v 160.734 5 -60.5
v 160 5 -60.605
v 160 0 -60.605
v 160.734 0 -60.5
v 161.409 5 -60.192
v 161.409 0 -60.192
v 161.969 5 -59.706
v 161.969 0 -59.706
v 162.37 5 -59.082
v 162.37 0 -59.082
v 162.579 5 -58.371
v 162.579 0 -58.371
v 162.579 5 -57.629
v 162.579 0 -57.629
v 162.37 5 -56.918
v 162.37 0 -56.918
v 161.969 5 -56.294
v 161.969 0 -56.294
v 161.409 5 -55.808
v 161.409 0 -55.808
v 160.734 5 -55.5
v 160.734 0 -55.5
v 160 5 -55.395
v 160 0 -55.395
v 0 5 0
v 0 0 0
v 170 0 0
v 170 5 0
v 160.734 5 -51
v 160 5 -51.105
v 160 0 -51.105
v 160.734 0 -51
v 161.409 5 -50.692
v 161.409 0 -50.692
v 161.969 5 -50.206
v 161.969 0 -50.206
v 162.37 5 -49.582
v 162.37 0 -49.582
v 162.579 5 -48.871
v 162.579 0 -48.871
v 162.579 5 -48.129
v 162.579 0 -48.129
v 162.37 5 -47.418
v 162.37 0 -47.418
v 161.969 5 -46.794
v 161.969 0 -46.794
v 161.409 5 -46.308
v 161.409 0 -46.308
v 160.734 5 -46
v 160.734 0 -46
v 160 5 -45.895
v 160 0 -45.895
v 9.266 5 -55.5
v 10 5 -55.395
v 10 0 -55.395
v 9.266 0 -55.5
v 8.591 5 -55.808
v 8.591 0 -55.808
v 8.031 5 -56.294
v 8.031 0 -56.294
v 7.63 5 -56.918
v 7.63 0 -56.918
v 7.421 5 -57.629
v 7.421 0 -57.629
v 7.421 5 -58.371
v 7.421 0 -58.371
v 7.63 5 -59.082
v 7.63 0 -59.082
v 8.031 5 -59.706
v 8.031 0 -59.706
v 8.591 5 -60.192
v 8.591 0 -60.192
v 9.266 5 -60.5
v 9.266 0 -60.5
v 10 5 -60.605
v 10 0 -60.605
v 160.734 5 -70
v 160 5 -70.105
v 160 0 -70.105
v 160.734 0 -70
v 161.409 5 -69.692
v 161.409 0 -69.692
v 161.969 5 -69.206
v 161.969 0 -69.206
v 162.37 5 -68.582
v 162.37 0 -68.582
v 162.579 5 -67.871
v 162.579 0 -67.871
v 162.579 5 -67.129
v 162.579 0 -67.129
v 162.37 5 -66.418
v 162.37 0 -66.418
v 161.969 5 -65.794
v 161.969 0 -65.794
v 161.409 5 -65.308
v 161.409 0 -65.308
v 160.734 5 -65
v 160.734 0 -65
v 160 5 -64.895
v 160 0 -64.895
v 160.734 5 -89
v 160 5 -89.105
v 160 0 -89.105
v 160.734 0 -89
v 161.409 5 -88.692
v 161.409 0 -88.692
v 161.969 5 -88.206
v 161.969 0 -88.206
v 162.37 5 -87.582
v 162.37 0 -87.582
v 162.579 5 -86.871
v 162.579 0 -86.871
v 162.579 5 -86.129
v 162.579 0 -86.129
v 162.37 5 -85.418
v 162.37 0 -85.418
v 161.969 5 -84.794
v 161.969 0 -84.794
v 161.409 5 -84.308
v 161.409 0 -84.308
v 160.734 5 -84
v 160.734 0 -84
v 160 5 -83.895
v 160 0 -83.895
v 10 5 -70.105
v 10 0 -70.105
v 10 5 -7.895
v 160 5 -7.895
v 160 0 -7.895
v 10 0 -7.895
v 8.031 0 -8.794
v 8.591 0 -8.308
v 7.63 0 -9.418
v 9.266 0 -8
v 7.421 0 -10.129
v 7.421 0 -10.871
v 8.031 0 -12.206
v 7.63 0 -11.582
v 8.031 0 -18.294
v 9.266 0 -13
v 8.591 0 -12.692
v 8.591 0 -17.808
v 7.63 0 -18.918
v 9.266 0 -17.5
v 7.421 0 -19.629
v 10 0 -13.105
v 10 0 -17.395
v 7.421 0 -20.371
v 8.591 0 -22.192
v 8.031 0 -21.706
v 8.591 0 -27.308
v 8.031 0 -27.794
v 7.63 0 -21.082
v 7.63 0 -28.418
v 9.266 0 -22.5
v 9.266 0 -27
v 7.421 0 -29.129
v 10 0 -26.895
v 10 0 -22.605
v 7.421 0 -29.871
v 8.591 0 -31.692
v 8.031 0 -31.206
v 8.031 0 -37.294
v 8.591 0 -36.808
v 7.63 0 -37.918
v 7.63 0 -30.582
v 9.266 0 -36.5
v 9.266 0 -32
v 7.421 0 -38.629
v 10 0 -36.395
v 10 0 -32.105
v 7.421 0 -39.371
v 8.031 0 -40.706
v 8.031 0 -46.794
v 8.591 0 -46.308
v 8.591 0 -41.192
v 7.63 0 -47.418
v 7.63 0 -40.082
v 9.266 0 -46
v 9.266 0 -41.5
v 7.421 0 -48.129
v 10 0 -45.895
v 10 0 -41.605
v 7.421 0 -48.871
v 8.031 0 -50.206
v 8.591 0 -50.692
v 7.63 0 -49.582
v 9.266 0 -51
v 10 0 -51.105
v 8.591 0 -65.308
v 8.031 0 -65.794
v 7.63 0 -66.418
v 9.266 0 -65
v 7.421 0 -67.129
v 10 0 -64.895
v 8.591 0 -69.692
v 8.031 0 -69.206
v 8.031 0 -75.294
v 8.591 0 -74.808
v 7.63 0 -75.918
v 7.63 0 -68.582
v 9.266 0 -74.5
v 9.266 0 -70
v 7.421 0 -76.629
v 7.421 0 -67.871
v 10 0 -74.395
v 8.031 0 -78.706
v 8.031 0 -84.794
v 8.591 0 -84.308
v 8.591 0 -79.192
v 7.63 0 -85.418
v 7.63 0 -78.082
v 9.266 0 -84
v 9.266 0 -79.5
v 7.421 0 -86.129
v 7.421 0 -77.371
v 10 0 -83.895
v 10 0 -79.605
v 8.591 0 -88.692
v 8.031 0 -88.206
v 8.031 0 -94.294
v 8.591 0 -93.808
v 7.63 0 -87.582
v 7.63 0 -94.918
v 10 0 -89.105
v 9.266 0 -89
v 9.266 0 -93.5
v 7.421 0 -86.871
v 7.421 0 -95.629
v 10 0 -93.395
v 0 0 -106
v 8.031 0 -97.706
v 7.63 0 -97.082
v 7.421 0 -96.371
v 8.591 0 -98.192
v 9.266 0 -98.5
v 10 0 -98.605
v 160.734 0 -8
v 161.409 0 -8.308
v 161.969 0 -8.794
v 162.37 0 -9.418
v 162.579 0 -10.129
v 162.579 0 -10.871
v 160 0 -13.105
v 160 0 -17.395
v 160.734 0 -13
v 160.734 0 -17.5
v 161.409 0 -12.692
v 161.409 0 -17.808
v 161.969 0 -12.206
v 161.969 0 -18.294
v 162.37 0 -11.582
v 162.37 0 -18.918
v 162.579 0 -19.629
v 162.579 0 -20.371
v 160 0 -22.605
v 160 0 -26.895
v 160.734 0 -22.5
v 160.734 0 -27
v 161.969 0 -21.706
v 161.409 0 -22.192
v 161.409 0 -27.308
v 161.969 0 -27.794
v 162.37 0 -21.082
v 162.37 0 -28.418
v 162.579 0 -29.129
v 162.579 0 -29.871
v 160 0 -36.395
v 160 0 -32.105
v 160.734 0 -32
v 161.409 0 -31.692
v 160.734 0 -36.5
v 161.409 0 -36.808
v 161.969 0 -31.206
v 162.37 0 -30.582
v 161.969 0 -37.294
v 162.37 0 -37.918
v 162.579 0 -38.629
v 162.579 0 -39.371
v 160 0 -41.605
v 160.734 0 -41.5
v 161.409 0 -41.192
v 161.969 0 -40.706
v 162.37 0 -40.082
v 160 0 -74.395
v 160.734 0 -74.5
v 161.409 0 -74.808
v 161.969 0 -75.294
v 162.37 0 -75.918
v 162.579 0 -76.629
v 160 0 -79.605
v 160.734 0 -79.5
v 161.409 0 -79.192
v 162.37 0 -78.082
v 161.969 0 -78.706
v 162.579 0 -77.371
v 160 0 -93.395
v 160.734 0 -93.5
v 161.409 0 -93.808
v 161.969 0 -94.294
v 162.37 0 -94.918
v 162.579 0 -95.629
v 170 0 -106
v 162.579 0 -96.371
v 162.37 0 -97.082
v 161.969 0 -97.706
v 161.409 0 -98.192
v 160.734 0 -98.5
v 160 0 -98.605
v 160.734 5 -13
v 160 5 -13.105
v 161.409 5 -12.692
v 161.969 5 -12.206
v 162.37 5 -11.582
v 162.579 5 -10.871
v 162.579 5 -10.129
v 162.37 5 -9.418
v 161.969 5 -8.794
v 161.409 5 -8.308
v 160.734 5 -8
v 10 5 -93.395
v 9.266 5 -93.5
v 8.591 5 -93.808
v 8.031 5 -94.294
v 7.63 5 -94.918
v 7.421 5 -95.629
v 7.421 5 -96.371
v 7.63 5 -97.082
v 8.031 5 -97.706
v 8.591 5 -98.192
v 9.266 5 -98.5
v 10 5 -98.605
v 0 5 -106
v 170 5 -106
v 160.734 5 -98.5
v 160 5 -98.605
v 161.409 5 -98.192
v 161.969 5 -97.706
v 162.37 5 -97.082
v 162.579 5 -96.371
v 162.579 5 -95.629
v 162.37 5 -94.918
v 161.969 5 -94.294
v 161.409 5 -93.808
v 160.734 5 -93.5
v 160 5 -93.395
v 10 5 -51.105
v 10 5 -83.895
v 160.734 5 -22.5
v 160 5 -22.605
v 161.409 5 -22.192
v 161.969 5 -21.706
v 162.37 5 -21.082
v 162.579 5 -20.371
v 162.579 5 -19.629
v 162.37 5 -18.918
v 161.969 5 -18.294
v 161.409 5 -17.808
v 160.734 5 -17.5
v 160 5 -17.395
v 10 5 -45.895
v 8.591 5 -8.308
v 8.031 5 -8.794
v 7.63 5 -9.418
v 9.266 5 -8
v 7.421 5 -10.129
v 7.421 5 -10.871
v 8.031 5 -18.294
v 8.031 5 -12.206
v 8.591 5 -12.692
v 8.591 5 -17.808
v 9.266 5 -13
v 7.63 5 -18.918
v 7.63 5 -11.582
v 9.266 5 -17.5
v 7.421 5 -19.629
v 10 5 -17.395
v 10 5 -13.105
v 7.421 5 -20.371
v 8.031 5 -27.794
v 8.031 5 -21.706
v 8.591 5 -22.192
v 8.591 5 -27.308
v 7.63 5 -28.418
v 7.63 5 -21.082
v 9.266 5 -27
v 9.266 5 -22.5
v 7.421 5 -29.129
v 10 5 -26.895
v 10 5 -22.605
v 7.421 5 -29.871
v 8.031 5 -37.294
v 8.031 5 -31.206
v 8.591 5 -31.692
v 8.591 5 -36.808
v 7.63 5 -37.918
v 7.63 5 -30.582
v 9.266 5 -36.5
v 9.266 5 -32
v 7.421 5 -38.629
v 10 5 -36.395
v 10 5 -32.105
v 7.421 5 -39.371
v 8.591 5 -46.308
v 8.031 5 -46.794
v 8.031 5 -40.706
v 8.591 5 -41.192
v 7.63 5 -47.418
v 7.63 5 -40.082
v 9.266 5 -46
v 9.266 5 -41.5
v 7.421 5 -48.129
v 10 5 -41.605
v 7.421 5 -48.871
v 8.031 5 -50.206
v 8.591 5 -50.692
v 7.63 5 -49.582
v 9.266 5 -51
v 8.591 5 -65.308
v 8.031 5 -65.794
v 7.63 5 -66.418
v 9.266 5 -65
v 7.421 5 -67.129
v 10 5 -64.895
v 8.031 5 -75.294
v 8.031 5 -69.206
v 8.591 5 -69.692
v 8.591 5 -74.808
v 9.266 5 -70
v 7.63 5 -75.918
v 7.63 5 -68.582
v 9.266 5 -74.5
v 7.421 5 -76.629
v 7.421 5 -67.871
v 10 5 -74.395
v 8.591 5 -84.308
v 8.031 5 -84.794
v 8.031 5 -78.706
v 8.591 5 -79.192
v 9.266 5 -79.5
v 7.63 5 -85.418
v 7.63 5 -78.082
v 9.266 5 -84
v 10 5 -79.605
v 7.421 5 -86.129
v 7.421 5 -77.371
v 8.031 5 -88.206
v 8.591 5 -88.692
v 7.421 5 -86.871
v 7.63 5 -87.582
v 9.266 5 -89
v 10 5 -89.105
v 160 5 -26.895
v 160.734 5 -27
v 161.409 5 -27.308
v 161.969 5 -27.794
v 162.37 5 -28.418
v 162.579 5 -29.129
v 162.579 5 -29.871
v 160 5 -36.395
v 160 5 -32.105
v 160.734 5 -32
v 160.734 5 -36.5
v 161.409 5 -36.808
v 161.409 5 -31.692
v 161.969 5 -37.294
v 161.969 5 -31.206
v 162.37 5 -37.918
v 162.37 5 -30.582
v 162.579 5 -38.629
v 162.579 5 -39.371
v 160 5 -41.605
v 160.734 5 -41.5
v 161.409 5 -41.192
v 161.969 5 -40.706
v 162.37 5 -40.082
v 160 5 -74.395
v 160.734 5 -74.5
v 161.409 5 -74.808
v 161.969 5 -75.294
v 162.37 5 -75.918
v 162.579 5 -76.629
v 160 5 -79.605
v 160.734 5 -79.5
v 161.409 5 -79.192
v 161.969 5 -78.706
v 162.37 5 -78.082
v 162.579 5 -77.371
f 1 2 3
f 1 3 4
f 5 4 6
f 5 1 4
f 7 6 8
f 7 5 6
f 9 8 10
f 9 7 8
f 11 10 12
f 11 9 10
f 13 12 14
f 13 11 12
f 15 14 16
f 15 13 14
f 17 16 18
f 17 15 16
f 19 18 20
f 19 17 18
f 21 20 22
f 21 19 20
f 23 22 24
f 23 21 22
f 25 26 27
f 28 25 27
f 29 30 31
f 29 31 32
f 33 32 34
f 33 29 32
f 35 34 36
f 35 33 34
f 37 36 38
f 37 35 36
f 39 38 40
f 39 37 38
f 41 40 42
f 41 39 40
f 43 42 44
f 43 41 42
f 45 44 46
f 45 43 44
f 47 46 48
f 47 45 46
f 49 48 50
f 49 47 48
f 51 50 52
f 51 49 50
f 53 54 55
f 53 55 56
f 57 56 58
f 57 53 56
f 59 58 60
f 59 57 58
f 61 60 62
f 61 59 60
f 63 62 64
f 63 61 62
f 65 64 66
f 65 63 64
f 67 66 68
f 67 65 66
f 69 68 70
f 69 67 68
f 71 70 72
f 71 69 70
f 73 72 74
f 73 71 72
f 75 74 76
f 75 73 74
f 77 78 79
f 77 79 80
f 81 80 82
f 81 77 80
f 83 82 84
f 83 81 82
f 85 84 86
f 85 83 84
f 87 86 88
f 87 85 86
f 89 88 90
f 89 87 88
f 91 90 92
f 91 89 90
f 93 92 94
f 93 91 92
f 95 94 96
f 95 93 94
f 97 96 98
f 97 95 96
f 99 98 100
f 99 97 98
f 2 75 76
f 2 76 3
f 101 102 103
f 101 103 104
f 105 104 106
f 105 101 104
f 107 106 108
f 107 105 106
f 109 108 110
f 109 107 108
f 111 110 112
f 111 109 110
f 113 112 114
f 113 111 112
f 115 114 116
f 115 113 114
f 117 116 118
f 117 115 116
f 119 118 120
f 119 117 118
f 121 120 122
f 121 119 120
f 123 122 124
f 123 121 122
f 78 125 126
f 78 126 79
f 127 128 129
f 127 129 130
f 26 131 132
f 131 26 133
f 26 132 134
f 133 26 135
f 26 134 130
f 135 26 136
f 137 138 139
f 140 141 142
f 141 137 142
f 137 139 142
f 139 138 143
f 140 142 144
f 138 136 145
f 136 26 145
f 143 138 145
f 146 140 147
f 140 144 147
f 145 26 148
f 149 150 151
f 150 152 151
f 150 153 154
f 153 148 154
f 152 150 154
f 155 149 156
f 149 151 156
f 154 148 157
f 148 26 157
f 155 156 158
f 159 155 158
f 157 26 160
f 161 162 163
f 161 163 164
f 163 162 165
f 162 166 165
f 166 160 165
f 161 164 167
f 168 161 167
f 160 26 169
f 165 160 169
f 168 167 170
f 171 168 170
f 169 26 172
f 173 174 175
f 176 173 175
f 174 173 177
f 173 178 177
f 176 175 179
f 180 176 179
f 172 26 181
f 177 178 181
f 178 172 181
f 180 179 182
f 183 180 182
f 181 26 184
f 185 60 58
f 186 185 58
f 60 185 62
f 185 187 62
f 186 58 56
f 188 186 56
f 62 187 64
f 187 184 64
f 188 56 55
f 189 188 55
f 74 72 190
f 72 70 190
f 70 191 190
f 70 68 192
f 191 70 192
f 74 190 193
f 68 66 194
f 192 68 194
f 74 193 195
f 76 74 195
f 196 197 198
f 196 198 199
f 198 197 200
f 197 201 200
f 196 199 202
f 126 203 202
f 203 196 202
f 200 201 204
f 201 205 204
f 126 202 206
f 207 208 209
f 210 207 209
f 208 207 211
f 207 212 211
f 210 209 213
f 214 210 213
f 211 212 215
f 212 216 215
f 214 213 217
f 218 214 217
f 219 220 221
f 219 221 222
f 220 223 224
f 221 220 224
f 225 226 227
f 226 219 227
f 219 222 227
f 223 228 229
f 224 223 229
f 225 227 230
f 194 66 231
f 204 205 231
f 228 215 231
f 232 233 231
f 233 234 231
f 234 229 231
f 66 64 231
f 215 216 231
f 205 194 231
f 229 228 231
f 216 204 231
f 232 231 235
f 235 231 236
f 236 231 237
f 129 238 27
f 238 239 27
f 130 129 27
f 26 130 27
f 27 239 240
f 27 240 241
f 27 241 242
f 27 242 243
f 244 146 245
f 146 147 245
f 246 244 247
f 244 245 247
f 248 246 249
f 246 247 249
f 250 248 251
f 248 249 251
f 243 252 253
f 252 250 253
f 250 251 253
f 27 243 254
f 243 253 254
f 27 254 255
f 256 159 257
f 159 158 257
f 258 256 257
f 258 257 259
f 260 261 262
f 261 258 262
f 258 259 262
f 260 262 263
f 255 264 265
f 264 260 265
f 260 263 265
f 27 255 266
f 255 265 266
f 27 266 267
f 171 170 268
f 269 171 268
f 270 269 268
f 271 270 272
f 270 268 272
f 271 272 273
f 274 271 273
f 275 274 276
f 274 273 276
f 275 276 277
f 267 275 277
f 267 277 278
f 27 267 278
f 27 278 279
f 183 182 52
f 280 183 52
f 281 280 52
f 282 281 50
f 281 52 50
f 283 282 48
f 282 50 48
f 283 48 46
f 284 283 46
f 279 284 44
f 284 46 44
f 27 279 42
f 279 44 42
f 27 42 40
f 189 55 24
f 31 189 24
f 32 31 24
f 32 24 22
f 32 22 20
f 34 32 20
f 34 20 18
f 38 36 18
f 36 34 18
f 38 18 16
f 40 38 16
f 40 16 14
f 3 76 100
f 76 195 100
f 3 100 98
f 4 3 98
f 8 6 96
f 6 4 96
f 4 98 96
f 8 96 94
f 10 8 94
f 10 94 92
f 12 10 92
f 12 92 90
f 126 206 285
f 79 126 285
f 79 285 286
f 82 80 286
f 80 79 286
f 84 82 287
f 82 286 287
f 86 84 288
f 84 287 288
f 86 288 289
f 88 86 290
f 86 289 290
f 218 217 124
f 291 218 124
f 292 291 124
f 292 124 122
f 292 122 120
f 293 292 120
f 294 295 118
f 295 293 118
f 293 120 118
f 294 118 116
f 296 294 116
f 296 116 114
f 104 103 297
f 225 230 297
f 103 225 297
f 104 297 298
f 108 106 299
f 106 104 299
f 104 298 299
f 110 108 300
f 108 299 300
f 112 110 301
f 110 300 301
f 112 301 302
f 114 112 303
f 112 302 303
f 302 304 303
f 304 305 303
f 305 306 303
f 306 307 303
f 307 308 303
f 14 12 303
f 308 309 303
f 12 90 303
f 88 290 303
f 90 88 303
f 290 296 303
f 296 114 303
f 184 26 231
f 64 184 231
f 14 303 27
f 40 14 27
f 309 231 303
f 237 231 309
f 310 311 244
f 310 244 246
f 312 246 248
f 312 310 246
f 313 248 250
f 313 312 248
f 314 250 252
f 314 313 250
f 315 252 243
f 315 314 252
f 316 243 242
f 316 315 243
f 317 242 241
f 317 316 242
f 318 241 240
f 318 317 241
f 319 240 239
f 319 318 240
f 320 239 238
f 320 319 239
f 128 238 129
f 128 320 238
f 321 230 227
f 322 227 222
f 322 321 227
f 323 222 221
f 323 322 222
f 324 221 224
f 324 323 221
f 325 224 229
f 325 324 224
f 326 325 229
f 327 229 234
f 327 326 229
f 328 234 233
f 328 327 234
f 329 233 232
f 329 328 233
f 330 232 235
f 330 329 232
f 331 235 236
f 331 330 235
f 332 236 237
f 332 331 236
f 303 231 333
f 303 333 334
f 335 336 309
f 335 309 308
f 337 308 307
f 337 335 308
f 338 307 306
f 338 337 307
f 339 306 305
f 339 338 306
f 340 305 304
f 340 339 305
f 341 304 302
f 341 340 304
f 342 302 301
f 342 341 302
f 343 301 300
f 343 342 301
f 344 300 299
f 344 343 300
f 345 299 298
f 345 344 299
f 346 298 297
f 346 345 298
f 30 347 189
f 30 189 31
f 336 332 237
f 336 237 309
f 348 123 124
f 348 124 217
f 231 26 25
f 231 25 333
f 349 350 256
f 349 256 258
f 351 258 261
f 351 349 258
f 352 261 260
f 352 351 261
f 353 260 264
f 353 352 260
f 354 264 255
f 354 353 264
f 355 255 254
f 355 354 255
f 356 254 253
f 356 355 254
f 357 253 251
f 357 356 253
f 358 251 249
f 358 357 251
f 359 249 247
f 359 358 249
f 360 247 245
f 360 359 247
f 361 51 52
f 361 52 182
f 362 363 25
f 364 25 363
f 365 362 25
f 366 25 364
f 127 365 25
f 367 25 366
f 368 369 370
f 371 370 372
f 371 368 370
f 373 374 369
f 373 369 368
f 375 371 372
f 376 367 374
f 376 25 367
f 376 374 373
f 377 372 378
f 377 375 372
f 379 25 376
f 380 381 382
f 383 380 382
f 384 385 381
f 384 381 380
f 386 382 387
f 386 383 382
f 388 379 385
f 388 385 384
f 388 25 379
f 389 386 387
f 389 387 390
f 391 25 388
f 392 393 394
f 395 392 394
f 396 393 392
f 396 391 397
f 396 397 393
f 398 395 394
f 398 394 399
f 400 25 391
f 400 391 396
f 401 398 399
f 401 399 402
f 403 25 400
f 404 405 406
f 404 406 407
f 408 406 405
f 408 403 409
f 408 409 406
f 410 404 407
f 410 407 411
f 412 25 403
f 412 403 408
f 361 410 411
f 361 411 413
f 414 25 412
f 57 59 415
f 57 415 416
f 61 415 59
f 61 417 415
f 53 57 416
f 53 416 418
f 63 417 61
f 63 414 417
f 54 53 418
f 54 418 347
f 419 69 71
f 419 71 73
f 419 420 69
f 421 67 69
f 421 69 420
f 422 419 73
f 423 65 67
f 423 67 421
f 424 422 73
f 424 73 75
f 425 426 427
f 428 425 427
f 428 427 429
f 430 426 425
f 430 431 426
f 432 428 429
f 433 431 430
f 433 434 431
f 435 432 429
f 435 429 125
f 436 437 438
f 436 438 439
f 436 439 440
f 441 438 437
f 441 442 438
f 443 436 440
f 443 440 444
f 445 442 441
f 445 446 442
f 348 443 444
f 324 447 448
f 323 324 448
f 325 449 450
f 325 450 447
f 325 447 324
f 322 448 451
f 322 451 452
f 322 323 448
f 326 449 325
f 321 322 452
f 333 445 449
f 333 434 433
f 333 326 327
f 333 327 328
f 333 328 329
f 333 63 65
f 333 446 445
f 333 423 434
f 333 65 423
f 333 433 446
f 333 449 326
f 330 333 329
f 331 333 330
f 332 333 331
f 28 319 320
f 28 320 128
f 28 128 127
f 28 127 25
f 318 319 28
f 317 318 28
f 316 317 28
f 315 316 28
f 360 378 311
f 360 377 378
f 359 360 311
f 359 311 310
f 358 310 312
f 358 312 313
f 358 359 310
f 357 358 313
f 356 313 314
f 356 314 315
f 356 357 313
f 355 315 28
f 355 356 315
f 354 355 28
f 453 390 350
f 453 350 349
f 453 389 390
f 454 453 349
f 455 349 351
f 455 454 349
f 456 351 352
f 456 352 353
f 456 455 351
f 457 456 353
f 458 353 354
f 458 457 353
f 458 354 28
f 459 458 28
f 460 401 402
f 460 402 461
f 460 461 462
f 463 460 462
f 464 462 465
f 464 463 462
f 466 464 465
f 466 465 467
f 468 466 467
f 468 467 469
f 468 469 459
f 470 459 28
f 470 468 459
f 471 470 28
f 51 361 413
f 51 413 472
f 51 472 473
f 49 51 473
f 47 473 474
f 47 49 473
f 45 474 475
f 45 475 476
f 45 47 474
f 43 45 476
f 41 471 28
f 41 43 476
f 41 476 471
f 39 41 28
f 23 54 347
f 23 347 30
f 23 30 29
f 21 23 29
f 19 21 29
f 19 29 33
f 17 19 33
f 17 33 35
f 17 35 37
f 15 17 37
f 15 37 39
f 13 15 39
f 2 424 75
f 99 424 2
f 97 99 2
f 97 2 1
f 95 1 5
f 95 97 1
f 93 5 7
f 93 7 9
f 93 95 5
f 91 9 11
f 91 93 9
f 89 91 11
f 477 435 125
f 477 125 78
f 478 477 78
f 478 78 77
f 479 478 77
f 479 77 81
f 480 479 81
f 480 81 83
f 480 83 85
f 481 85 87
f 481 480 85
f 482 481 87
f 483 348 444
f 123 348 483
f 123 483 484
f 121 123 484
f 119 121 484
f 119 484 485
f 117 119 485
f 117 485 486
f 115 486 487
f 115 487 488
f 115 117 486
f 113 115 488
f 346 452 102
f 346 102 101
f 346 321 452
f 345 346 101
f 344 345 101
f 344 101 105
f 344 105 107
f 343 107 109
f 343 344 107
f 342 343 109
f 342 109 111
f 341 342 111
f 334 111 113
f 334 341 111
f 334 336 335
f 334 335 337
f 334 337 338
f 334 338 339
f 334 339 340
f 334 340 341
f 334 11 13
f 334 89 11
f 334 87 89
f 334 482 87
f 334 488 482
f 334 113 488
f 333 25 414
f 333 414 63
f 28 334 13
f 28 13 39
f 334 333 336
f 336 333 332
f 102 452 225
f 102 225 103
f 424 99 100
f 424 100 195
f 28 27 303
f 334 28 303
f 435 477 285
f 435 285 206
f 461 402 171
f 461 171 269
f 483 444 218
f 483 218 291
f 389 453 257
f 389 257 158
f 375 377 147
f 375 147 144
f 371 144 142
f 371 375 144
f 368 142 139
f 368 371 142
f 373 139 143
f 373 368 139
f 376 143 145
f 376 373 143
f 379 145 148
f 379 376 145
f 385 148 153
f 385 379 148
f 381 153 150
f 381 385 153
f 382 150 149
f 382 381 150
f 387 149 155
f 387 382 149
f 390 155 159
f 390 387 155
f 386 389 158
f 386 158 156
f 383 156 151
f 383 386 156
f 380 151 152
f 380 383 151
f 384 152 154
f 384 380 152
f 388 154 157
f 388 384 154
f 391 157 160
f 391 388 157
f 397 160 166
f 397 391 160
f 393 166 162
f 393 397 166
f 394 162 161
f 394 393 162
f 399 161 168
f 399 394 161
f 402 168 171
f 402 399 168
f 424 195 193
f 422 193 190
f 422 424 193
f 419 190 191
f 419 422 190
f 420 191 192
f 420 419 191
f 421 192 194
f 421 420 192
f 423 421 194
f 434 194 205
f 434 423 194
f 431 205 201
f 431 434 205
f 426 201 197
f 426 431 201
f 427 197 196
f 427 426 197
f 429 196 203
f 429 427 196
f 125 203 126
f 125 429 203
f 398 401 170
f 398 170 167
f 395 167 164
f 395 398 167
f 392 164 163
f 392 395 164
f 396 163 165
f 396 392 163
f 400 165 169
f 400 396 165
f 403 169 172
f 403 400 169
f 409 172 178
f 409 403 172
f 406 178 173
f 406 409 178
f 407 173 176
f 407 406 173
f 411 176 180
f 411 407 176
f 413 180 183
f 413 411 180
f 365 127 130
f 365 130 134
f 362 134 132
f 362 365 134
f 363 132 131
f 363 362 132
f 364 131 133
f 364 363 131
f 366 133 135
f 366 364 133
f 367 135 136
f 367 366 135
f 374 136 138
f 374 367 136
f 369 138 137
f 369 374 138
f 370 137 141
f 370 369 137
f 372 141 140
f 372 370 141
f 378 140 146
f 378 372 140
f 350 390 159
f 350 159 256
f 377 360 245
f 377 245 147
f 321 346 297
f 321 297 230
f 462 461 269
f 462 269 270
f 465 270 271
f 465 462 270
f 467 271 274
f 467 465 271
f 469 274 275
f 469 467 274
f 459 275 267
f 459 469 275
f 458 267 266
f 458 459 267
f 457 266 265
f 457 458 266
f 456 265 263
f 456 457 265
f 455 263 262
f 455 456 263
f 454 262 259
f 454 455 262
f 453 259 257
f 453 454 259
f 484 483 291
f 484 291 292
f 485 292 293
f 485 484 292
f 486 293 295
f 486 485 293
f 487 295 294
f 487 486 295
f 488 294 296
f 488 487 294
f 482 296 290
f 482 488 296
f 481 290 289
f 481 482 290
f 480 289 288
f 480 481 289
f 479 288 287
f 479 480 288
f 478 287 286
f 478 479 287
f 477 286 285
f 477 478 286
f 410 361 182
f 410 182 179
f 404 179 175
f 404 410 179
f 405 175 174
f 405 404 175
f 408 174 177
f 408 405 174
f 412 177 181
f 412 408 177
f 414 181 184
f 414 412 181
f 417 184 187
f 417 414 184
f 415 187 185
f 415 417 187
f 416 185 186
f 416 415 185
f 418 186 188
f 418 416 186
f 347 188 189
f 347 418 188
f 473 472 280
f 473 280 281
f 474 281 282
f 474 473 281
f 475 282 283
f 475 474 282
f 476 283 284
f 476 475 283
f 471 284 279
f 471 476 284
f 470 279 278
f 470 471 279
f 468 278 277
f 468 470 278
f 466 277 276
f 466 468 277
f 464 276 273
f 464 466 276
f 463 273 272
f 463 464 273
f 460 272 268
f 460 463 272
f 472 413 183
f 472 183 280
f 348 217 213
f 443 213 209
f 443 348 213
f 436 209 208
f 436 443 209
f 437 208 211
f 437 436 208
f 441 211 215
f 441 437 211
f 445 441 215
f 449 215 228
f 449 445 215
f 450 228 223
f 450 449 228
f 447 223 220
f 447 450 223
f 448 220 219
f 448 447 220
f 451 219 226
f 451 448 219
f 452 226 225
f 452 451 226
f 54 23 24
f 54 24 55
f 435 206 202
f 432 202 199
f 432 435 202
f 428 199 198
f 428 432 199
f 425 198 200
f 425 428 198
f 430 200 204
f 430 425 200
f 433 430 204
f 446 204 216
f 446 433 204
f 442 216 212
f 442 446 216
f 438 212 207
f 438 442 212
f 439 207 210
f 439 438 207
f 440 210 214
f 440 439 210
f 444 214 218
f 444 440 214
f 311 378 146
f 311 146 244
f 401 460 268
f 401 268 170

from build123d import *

# Parameters (mm, degrees)
SKETCH1_W           = 170
SKETCH1_H           = 106
BOSS_EXTRUDE1_DEPTH = 5
CUT_EXTRUDE2_REACH  = 202.402


with BuildPart() as part:
    # Sketch1 → Boss-Extrude1 (new body)
    with BuildSketch(Plane(origin=(0, 0, 0), x_dir=(1, 0, 0), z_dir=(0, 1, 0))):
        with Locations((85, 53)):
            Rectangle(SKETCH1_W, SKETCH1_H)
    extrude(amount=BOSS_EXTRUDE1_DEPTH)

    # Sketch2 → Cut-Extrude2 (cut, up to next)
    with BuildSketch(Plane(origin=(0, 5, 0), x_dir=(1, 0, 0), z_dir=(0, 1, 0)), mode=Mode.PRIVATE) as cut_extrude2_sk1:
        with BuildLine():
            Line((10, 98.605263158), (160, 98.605263158))
            ThreePointArc((160, 98.605263158), (162.605263158, 96), (160, 93.394736842))
            Line((160, 93.394736842), (10, 93.394736842))
            ThreePointArc((10, 93.394736842), (7.394736842, 96), (10, 98.605263158))
        make_face()
    cut_extrude2_tool1 = extrude(cut_extrude2_sk1.sketch, amount=-CUT_EXTRUDE2_REACH, mode=Mode.PRIVATE) & part.part
    # Sketch2 → Cut-Extrude2 (cut, up to next)
    with BuildSketch(Plane(origin=(0, 5, 0), x_dir=(1, 0, 0), z_dir=(0, 1, 0)), mode=Mode.PRIVATE) as cut_extrude2_sk2:
        with BuildLine():
            Line((10, 89.105263158), (160, 89.105263158))
            ThreePointArc((160, 89.105263158), (162.605263158, 86.5), (160, 83.894736842))
            Line((160, 83.894736842), (10, 83.894736842))
            ThreePointArc((10, 83.894736842), (7.394736842, 86.5), (10, 89.105263158))
        make_face()
    cut_extrude2_tool2 = extrude(cut_extrude2_sk2.sketch, amount=-CUT_EXTRUDE2_REACH, mode=Mode.PRIVATE) & part.part
    # Sketch2 → Cut-Extrude2 (cut, up to next)
    with BuildSketch(Plane(origin=(0, 5, 0), x_dir=(1, 0, 0), z_dir=(0, 1, 0)), mode=Mode.PRIVATE) as cut_extrude2_sk3:
        with BuildLine():
            Line((10, 79.605263158), (160, 79.605263158))
            ThreePointArc((160, 79.605263158), (162.605263158, 77), (160, 74.394736842))
            Line((160, 74.394736842), (10, 74.394736842))
            ThreePointArc((10, 74.394736842), (7.394736842, 77), (10, 79.605263158))
        make_face()
    cut_extrude2_tool3 = extrude(cut_extrude2_sk3.sketch, amount=-CUT_EXTRUDE2_REACH, mode=Mode.PRIVATE) & part.part
    # Sketch2 → Cut-Extrude2 (cut, up to next)
    with BuildSketch(Plane(origin=(0, 5, 0), x_dir=(1, 0, 0), z_dir=(0, 1, 0)), mode=Mode.PRIVATE) as cut_extrude2_sk4:
        with BuildLine():
            Line((10, 70.105263158), (160, 70.105263158))
            ThreePointArc((160, 70.105263158), (162.605263158, 67.5), (160, 64.894736842))
            Line((160, 64.894736842), (10, 64.894736842))
            ThreePointArc((10, 64.894736842), (7.394736842, 67.5), (10, 70.105263158))
        make_face()
    cut_extrude2_tool4 = extrude(cut_extrude2_sk4.sketch, amount=-CUT_EXTRUDE2_REACH, mode=Mode.PRIVATE) & part.part
    # Sketch2 → Cut-Extrude2 (cut, up to next)
    with BuildSketch(Plane(origin=(0, 5, 0), x_dir=(1, 0, 0), z_dir=(0, 1, 0)), mode=Mode.PRIVATE) as cut_extrude2_sk5:
        with BuildLine():
            Line((10, 60.605263158), (160, 60.605263158))
            ThreePointArc((160, 60.605263158), (162.605263158, 58), (160, 55.394736842))
            Line((160, 55.394736842), (10, 55.394736842))
            ThreePointArc((10, 55.394736842), (7.394736842, 58), (10, 60.605263158))
        make_face()
    cut_extrude2_tool5 = extrude(cut_extrude2_sk5.sketch, amount=-CUT_EXTRUDE2_REACH, mode=Mode.PRIVATE) & part.part
    # Sketch2 → Cut-Extrude2 (cut, up to next)
    with BuildSketch(Plane(origin=(0, 5, 0), x_dir=(1, 0, 0), z_dir=(0, 1, 0)), mode=Mode.PRIVATE) as cut_extrude2_sk6:
        with BuildLine():
            Line((10, 51.105263158), (160, 51.105263158))
            ThreePointArc((160, 51.105263158), (162.605263158, 48.5), (160, 45.894736842))
            Line((160, 45.894736842), (10, 45.894736842))
            ThreePointArc((10, 45.894736842), (7.394736842, 48.5), (10, 51.105263158))
        make_face()
    cut_extrude2_tool6 = extrude(cut_extrude2_sk6.sketch, amount=-CUT_EXTRUDE2_REACH, mode=Mode.PRIVATE) & part.part
    # Sketch2 → Cut-Extrude2 (cut, up to next)
    with BuildSketch(Plane(origin=(0, 5, 0), x_dir=(1, 0, 0), z_dir=(0, 1, 0)), mode=Mode.PRIVATE) as cut_extrude2_sk7:
        with BuildLine():
            Line((10, 41.605263158), (160, 41.605263158))
            ThreePointArc((160, 41.605263158), (162.605263158, 39), (160, 36.394736842))
            Line((160, 36.394736842), (10, 36.394736842))
            ThreePointArc((10, 36.394736842), (7.394736842, 39), (10, 41.605263158))
        make_face()
    cut_extrude2_tool7 = extrude(cut_extrude2_sk7.sketch, amount=-CUT_EXTRUDE2_REACH, mode=Mode.PRIVATE) & part.part
    # Sketch2 → Cut-Extrude2 (cut, up to next)
    with BuildSketch(Plane(origin=(0, 5, 0), x_dir=(1, 0, 0), z_dir=(0, 1, 0)), mode=Mode.PRIVATE) as cut_extrude2_sk8:
        with BuildLine():
            Line((10, 32.105263158), (160, 32.105263158))
            ThreePointArc((160, 32.105263158), (162.605263158, 29.5), (160, 26.894736842))
            Line((160, 26.894736842), (10, 26.894736842))
            ThreePointArc((10, 26.894736842), (7.394736842, 29.5), (10, 32.105263158))
        make_face()
    cut_extrude2_tool8 = extrude(cut_extrude2_sk8.sketch, amount=-CUT_EXTRUDE2_REACH, mode=Mode.PRIVATE) & part.part
    # Sketch2 → Cut-Extrude2 (cut, up to next)
    with BuildSketch(Plane(origin=(0, 5, 0), x_dir=(1, 0, 0), z_dir=(0, 1, 0)), mode=Mode.PRIVATE) as cut_extrude2_sk9:
        with BuildLine():
            Line((10, 22.605263158), (160, 22.605263158))
            ThreePointArc((160, 22.605263158), (162.605263158, 20), (160, 17.394736842))
            Line((160, 17.394736842), (10, 17.394736842))
            ThreePointArc((10, 17.394736842), (7.394736842, 20), (10, 22.605263158))
        make_face()
    cut_extrude2_tool9 = extrude(cut_extrude2_sk9.sketch, amount=-CUT_EXTRUDE2_REACH, mode=Mode.PRIVATE) & part.part
    # Sketch2 → Cut-Extrude2 (cut, up to next)
    with BuildSketch(Plane(origin=(0, 5, 0), x_dir=(1, 0, 0), z_dir=(0, 1, 0)), mode=Mode.PRIVATE) as cut_extrude2_sk10:
        with BuildLine():
            Line((10, 13.105263158), (160, 13.105263158))
            ThreePointArc((160, 13.105263158), (162.605263158, 10.5), (160, 7.894736842))
            Line((160, 7.894736842), (10, 7.894736842))
            ThreePointArc((10, 7.894736842), (7.394736842, 10.5), (10, 13.105263158))
        make_face()
    cut_extrude2_tool10 = extrude(cut_extrude2_sk10.sketch, amount=-CUT_EXTRUDE2_REACH, mode=Mode.PRIVATE) & part.part
    add(cut_extrude2_tool1.solids().sort_by_distance((85, 5, -96))[0], mode=Mode.SUBTRACT)
    add(cut_extrude2_tool2.solids().sort_by_distance((85, 5, -86.5))[0], mode=Mode.SUBTRACT)
    add(cut_extrude2_tool3.solids().sort_by_distance((85, 5, -77))[0], mode=Mode.SUBTRACT)
    add(cut_extrude2_tool4.solids().sort_by_distance((85, 5, -67.5))[0], mode=Mode.SUBTRACT)
    add(cut_extrude2_tool5.solids().sort_by_distance((85, 5, -58))[0], mode=Mode.SUBTRACT)
    add(cut_extrude2_tool6.solids().sort_by_distance((85, 5, -48.5))[0], mode=Mode.SUBTRACT)
    add(cut_extrude2_tool7.solids().sort_by_distance((85, 5, -39))[0], mode=Mode.SUBTRACT)
    add(cut_extrude2_tool8.solids().sort_by_distance((85, 5, -29.5))[0], mode=Mode.SUBTRACT)
    add(cut_extrude2_tool9.solids().sort_by_distance((85, 5, -20))[0], mode=Mode.SUBTRACT)
    add(cut_extrude2_tool10.solids().sort_by_distance((85, 5, -10.5))[0], mode=Mode.SUBTRACT)


solid = part.part
